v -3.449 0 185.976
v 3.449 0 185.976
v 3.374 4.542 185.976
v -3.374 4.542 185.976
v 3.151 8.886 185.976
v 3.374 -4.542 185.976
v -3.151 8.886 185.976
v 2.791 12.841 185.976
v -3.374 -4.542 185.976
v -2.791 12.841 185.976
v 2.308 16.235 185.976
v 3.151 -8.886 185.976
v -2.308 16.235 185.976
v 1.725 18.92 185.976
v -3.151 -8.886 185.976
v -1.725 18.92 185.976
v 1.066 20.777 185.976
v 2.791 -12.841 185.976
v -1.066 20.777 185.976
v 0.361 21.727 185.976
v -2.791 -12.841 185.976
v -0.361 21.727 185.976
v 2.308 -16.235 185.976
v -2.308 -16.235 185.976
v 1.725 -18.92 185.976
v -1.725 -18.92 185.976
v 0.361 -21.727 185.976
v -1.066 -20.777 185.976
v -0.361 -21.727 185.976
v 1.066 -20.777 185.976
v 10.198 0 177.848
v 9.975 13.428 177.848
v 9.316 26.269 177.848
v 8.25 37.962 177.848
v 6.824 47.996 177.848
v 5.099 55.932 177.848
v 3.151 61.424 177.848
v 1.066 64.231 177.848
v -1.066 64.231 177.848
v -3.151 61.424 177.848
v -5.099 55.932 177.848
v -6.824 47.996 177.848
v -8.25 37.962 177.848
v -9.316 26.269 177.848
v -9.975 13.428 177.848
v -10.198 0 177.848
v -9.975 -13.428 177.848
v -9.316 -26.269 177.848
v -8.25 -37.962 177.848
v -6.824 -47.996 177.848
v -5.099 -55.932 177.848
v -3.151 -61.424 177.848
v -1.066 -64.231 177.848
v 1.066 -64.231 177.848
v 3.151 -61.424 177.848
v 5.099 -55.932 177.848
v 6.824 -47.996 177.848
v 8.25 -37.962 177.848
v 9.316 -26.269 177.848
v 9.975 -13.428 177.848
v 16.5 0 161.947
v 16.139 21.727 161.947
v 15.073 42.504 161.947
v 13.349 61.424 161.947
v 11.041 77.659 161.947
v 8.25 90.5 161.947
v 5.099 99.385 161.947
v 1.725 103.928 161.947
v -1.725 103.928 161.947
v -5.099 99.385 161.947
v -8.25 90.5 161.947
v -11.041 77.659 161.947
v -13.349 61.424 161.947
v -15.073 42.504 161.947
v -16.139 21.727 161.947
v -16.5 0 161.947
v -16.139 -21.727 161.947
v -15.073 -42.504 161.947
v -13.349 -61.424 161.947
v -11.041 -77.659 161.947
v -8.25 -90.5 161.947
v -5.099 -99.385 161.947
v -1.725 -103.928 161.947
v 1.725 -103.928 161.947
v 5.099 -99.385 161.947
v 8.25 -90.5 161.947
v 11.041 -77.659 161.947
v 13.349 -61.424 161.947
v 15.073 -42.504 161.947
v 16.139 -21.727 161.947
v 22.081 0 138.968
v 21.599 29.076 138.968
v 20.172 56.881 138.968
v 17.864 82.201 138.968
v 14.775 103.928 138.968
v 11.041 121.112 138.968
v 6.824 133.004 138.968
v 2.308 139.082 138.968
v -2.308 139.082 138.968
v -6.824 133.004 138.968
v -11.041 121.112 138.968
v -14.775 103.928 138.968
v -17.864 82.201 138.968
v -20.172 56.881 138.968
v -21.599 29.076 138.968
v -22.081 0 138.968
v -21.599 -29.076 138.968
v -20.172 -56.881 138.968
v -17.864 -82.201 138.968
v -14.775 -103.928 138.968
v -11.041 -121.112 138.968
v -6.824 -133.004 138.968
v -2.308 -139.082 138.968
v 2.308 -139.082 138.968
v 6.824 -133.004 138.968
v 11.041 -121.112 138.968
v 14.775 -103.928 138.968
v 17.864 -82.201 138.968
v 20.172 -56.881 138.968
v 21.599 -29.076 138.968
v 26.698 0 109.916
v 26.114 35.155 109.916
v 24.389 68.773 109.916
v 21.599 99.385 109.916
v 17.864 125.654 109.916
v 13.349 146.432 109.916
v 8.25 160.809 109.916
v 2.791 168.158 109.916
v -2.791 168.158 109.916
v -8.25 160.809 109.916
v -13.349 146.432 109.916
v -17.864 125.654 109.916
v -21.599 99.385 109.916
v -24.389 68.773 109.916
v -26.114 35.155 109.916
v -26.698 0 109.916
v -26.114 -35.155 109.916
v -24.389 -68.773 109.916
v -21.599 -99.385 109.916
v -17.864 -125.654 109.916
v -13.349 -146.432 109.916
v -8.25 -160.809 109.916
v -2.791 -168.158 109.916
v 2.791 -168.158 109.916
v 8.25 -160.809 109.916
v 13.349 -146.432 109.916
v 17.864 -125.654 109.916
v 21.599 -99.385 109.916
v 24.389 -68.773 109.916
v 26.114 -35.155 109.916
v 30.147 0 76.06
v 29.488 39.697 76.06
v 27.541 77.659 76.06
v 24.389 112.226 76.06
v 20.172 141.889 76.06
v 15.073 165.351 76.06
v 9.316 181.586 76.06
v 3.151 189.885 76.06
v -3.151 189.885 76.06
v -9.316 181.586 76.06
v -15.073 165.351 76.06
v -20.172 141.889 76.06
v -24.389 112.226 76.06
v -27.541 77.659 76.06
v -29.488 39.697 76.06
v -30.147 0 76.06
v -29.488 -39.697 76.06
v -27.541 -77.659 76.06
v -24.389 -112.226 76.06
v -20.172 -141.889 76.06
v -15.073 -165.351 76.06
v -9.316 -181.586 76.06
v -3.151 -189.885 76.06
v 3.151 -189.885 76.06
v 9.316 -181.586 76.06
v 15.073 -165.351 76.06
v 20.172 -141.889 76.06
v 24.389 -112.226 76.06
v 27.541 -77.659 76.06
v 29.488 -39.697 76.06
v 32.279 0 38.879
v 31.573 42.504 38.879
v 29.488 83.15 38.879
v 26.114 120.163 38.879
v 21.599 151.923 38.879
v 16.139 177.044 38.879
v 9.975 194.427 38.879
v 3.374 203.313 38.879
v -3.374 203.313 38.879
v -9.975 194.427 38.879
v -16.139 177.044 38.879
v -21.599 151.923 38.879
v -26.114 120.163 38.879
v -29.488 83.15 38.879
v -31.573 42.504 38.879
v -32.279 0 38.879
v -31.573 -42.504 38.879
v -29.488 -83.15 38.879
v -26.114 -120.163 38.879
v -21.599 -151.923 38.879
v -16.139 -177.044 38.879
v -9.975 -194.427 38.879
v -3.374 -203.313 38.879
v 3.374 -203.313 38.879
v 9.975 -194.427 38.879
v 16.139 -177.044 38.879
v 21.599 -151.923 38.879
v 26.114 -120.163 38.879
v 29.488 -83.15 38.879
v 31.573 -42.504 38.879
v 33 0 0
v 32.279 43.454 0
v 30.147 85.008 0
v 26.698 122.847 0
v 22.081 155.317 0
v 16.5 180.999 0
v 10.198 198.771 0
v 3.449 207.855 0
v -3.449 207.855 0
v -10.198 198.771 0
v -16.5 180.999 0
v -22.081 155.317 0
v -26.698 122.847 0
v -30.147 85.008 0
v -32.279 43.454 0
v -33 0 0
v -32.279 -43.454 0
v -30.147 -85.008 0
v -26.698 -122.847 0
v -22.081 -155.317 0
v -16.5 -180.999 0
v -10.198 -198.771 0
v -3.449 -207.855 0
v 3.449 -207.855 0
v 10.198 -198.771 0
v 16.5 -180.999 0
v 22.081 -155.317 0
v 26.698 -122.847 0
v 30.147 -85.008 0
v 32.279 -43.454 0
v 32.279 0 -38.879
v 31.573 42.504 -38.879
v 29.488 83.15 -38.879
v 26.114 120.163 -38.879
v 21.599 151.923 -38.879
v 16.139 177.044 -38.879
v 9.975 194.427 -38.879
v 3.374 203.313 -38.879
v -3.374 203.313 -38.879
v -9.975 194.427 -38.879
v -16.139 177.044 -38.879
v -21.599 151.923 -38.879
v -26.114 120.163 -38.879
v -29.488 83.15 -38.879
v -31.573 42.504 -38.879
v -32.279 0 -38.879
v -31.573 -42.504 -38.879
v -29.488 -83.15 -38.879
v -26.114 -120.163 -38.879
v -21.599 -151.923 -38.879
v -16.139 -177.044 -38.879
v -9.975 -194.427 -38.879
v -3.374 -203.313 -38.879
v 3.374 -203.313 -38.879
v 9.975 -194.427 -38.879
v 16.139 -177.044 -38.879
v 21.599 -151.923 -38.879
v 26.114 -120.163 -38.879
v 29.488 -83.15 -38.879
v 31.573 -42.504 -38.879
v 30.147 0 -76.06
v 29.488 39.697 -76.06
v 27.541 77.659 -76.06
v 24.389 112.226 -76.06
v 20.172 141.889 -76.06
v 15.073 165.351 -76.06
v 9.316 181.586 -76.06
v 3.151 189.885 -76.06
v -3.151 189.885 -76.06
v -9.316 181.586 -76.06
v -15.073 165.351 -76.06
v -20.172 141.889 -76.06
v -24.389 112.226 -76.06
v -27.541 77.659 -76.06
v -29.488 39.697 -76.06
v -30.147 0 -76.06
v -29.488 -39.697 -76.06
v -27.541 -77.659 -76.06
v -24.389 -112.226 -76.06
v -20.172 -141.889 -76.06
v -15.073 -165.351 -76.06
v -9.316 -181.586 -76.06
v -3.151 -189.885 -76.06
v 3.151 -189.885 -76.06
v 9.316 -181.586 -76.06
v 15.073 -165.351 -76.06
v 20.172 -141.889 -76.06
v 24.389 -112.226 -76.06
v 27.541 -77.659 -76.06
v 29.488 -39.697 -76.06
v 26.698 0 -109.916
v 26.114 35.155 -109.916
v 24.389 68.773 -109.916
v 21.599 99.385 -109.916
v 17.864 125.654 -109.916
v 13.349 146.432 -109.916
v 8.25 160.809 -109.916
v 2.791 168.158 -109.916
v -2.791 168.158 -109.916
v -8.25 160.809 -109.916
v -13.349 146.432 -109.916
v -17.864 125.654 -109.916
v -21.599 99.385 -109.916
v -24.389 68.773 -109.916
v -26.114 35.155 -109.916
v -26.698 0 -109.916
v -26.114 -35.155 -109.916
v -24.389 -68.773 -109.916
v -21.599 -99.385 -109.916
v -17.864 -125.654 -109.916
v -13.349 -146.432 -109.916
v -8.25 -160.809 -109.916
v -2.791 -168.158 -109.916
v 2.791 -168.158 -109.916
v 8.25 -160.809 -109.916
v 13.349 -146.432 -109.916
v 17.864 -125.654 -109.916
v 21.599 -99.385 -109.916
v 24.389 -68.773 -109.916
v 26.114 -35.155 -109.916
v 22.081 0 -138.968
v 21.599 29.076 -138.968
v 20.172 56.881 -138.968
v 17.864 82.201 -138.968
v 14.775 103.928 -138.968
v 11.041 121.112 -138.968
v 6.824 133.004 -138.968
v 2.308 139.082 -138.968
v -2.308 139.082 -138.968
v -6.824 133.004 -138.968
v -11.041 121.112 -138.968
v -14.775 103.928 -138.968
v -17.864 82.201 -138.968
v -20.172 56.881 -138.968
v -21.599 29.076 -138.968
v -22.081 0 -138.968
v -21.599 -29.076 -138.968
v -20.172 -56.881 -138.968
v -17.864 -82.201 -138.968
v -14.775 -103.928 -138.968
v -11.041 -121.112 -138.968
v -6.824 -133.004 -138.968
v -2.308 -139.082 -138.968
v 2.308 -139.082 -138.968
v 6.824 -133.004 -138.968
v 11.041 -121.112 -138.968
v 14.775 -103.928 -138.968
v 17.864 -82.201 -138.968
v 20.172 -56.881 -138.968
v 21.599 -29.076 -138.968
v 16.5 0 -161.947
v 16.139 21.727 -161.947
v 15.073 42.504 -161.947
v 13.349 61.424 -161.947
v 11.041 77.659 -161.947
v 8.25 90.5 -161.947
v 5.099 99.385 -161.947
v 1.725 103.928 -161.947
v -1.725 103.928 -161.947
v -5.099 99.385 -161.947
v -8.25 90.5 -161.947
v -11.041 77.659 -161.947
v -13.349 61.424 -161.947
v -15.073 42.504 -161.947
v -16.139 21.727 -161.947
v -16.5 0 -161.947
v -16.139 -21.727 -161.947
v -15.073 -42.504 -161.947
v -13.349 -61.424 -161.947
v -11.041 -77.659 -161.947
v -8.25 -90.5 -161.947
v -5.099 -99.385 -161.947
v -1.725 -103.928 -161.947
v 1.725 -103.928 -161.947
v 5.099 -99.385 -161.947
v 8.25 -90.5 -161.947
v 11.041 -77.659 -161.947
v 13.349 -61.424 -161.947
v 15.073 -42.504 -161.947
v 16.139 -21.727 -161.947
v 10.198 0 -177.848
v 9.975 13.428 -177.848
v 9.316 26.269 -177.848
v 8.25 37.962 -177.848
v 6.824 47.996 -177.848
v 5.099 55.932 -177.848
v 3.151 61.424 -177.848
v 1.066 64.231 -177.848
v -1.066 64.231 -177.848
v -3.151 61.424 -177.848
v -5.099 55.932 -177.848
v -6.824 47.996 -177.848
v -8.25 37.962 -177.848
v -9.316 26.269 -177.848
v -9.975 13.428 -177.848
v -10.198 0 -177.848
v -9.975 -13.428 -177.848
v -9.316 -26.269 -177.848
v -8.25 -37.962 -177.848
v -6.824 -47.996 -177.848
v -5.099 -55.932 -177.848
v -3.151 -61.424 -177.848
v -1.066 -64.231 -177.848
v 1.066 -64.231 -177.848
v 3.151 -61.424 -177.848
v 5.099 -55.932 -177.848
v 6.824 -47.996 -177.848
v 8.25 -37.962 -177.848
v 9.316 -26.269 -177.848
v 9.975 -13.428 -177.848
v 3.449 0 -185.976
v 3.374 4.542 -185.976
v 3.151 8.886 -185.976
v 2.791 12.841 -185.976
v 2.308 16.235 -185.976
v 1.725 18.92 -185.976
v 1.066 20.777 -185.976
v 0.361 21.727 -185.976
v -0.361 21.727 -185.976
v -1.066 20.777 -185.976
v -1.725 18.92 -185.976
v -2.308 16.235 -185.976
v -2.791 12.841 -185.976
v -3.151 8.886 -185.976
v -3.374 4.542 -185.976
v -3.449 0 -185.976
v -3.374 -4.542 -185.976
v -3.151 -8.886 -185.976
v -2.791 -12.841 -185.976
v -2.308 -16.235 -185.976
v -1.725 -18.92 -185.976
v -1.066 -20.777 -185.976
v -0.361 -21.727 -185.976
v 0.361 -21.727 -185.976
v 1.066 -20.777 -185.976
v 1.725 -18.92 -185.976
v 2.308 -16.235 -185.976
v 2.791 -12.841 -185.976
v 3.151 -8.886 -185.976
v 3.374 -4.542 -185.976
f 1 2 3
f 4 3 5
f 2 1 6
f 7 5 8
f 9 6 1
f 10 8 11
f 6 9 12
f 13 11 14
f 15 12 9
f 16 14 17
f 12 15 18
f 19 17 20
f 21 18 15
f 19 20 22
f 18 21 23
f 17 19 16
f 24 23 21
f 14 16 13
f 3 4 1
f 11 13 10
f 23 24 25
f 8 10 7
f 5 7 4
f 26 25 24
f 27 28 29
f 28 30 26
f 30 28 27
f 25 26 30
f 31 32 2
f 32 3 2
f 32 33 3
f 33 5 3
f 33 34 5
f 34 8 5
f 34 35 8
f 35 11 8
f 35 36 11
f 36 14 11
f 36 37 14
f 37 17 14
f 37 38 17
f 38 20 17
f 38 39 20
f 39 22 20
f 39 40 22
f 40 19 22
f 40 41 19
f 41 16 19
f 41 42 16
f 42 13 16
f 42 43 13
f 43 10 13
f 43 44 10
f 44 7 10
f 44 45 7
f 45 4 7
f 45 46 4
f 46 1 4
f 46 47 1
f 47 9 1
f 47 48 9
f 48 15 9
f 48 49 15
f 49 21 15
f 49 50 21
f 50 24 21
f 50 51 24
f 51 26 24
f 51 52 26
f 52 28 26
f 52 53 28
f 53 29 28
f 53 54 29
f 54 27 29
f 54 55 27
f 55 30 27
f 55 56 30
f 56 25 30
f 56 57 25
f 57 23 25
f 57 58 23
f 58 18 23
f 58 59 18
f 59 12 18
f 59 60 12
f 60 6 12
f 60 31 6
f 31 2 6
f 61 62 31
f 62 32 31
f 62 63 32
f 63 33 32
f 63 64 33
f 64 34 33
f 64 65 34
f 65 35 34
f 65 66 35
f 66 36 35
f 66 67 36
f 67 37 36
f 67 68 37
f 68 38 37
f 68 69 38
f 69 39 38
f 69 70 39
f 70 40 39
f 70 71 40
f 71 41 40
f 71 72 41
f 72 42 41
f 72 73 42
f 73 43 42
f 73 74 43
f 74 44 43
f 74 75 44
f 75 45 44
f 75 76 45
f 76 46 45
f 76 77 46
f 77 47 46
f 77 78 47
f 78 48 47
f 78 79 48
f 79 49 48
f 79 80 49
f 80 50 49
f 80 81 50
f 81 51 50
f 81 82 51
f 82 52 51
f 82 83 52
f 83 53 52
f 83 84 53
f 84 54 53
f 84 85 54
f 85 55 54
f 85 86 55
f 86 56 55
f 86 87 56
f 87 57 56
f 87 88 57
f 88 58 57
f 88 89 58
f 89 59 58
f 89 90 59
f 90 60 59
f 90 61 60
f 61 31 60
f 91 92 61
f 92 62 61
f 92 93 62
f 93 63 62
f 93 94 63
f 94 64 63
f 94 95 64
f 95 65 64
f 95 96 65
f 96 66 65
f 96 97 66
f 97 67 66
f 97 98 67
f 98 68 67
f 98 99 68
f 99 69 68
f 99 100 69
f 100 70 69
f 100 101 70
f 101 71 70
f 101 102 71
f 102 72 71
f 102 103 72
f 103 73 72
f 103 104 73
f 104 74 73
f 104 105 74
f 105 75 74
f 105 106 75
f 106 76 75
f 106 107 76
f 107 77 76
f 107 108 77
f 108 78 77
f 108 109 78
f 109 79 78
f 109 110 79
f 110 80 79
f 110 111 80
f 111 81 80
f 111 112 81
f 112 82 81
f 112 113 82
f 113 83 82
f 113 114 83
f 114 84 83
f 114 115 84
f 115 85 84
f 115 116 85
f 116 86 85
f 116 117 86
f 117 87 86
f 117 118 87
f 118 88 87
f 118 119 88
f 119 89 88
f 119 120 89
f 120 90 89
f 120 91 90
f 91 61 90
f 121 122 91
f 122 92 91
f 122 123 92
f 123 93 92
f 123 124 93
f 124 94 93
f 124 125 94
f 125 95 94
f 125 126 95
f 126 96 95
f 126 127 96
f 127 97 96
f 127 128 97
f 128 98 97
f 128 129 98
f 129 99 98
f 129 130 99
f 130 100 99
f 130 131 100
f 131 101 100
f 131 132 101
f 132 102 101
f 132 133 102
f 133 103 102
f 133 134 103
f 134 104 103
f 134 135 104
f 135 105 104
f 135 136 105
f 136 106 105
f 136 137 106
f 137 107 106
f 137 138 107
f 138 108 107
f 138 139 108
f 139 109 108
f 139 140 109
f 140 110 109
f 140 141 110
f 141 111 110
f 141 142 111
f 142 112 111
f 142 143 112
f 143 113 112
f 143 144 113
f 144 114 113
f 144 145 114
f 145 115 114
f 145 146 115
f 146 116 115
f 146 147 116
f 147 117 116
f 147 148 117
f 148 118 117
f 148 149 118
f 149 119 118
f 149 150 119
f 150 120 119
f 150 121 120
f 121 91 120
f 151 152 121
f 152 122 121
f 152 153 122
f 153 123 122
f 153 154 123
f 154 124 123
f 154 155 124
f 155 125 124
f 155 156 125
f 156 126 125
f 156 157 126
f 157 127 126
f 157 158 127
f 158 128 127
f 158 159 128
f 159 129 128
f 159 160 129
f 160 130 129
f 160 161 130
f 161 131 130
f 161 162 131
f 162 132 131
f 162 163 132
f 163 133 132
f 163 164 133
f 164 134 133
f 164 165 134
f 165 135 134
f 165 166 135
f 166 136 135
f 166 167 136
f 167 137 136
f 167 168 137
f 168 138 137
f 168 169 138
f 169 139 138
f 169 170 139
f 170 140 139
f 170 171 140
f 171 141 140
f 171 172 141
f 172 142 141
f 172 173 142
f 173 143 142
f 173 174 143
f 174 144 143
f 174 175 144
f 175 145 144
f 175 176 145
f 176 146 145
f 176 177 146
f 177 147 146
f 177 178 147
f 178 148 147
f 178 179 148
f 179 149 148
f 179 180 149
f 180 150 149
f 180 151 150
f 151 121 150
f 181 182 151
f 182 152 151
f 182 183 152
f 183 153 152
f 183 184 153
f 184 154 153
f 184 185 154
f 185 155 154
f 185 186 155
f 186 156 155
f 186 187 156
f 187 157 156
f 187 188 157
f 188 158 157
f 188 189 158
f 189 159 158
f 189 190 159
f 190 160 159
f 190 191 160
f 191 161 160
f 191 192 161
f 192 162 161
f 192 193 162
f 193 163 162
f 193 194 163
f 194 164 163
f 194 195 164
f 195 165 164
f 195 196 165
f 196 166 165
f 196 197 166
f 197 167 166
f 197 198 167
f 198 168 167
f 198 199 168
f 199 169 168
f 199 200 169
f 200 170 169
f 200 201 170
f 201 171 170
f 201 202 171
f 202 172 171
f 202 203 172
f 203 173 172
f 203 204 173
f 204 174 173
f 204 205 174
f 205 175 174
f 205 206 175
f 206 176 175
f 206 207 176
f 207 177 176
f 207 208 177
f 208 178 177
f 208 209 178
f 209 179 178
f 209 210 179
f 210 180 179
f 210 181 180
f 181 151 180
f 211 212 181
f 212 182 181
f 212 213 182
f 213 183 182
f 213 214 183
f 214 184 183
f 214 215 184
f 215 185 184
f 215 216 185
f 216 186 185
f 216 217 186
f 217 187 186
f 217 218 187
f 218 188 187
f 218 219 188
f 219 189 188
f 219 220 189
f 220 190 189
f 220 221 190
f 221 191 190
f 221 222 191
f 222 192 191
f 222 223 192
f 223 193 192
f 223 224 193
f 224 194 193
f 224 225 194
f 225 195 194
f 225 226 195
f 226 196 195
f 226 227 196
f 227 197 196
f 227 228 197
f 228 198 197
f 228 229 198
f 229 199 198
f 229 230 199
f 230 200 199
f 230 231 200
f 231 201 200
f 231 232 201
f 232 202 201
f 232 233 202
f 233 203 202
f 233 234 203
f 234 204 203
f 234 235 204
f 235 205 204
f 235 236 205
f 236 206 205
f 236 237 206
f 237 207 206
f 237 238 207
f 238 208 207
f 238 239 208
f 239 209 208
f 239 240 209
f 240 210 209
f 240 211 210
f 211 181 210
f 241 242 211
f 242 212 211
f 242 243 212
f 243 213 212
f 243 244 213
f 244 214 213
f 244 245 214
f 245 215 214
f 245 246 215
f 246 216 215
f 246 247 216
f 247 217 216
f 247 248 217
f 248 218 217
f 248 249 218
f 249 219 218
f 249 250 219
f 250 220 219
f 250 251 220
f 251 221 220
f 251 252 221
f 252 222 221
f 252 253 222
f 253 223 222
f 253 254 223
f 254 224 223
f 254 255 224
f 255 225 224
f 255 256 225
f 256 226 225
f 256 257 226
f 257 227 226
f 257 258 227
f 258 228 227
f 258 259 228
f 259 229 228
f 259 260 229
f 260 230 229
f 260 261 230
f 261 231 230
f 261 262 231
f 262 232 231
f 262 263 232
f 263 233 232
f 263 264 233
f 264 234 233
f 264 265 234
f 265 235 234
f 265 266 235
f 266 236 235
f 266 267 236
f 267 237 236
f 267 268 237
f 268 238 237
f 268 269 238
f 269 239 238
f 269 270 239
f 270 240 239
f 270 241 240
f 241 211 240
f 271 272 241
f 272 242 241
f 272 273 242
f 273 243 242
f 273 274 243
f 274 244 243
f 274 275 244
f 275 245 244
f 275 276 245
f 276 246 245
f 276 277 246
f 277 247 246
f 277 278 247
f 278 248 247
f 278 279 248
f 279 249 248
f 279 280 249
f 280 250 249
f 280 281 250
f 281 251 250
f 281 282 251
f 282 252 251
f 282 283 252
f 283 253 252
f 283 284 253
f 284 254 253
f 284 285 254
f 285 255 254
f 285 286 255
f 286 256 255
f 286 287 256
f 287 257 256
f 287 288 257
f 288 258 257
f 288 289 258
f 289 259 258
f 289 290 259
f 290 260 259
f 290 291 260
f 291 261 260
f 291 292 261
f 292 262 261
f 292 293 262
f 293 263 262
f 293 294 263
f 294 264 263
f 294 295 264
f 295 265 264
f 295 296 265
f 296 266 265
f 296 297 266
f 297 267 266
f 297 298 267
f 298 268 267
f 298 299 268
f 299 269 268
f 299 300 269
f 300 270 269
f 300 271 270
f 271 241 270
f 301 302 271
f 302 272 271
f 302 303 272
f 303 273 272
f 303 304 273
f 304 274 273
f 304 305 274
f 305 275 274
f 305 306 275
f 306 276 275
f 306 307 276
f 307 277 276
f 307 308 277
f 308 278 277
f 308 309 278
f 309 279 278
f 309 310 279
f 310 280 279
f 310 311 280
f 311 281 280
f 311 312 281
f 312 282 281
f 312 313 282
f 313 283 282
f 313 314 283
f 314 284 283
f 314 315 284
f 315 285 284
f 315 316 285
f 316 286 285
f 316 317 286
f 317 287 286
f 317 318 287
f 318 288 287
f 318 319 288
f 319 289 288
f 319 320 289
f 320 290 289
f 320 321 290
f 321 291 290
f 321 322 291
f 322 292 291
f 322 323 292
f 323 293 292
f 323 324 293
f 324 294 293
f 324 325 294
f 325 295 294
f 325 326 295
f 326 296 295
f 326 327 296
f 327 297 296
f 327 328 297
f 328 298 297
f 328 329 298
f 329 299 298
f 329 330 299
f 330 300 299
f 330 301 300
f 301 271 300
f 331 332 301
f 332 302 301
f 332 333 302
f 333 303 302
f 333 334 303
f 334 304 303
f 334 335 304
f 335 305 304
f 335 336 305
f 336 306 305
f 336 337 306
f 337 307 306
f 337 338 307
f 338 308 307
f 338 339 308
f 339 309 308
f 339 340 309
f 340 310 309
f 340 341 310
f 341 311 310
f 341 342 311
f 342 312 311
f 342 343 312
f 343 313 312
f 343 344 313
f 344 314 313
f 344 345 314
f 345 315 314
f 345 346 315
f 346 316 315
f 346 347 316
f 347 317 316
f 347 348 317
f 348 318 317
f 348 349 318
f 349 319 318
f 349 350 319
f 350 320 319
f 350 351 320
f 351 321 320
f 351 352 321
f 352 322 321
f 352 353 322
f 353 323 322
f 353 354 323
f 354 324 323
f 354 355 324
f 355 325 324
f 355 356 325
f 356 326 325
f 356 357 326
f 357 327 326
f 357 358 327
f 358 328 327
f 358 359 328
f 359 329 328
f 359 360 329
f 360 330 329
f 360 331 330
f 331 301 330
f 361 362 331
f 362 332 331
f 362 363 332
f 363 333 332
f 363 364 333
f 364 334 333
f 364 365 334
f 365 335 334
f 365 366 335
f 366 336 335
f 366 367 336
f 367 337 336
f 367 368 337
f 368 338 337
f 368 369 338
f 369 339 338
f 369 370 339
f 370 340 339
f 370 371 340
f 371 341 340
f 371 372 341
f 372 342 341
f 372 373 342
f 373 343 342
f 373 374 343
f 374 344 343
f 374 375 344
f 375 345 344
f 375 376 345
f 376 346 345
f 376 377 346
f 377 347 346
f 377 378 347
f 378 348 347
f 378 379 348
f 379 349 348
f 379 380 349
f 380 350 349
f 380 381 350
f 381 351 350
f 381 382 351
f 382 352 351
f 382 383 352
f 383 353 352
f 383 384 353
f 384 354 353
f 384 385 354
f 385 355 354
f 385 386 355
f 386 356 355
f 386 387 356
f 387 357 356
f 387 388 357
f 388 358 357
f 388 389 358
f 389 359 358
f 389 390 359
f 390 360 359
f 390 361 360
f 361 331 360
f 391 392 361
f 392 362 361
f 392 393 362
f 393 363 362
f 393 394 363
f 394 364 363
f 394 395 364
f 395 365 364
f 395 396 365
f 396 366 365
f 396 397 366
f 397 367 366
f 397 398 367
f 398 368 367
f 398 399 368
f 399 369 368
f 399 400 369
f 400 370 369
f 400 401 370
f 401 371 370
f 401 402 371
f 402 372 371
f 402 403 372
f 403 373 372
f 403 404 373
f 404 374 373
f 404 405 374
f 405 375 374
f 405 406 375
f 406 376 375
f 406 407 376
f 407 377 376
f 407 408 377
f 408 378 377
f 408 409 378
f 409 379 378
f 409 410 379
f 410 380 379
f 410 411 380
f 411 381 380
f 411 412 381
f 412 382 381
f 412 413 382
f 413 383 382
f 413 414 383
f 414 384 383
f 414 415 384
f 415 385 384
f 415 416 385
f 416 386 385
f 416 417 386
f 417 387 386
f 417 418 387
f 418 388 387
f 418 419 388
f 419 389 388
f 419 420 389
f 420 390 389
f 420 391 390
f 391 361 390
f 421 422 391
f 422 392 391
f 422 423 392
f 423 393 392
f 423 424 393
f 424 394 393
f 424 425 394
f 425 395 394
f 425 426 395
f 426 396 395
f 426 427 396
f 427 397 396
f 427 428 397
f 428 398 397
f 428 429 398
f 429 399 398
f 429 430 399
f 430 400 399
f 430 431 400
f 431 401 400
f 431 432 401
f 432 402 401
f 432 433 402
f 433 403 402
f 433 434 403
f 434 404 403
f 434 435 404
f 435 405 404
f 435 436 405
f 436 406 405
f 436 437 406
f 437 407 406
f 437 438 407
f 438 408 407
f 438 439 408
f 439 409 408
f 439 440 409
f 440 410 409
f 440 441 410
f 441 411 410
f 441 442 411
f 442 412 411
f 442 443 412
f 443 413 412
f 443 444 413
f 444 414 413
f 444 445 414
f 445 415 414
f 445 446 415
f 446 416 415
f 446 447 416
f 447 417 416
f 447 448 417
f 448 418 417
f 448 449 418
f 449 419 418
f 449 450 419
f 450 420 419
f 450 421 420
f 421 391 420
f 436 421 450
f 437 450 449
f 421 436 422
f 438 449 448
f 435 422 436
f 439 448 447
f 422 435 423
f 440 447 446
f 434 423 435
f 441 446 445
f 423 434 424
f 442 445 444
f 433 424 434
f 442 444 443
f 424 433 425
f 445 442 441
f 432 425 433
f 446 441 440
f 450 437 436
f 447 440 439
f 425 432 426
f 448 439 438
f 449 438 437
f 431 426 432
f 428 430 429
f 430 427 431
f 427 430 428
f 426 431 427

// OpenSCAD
// Generated by SolidPython 1.0.1 on 2020-07-29 00:46:46


scale(v = [3, 19, 17]) {
	sphere(r = 11);
}
/***********************************************
*********      SolidPython code:      **********
************************************************
 
# import packages: SolidPython
from solid import *
from solid.utils import *
from itertools import chain, combinations, permutations


class Resize:

    def __init__(self, scad_file):
        self.scad_file = scad_file
        #self.scad_file = import_scad(scad_file)
        # cone/cylinder param:
        self.r1 = 0
        self.r2 = 0
        self.h = 0
        # rectangular prism param:
        self.w = 0
        self.l = 0
        # ellipse param:
        self.r = 0

    # import OpenScad code (file name corresponds to shape)


    # classify shape + parameters
    def assign(self, param1, param2, param3):
        if self.scad_file == 'cone.scad':
            self.r1 = param1
            self.r2 = param2
            self.h = param3
        elif self.scad_file == 'cylinder.scad':
            self.r1 = param1
            self.r2 = param2
            self.h = param3
        elif self.scad_file == 'rectangularPrism.scad':
            self.h = param1
            self.l = param2
            self.w = param3
        else:
            self.r = param1
            self.h = param2

    # resize parameters
    def iterate(self):
        x = range(3, 20, 2)
        i = 1
        if self.scad_file == 'cone.scad':
            tempList = list(permutations(x, 2))
            for temp in tempList:
                param1 = temp[0]
                param2 = temp[1]
                filepath = 'produced_scad_files/' + 'cone' + str(param1) + '_' + str(param2) + '_' + '.scad'
                scad_render_to_file(cylinder(h=param1, r1=param2, r2=0), filepath)

        elif self.scad_file == 'cylinder.scad':
            tempList = list(permutations(x, 3))
            for temp in tempList:
                param1 = temp[0]
                param2 = temp[1]
                filepath = 'produced_scad_files/' + 'cylinder' + str(param1) + '_' + str(param2) + '_' + '.scad'
                scad_render_to_file(cylinder(h=param1, r1=param2, r2=param2), filepath)

        elif self.scad_file == 'rectangularPrism.scad':
            tempList = list(permutations(x, 3))
            for temp in tempList:
                param1 = temp[0]
                param2 = temp[1]
                param3 = temp[2]
                filepath = 'produced_scad_files/' + 'rectangularPrism' + str(param1) + '_' + str(param2) + '_' + str(
                    param3) + '.scad'
                scad_render_to_file(cube(size=(param1, param2, param3)), filepath)

        elif self.scad_file == 'ellipse.scad':
            tempList = list(permutations(x, 4))
            for temp in tempList:
                param1 = temp[0]
                param2 = temp[1]
                param3 = temp[2]
                param4 = temp[3]
                filepath = 'produced_scad_files/' + 'ellipse' + str(param1) + '_' + str(param2) + '_' + str(param3) + '_' + str(param4) + '.scad'
                scad_render_to_file(scale([param1, param2, param3])(sphere(r=param4)), filepath)

    def render_to_scadfile(self):
        scad_render_to_file(scad, 'example.scad') 
 
************************************************/
